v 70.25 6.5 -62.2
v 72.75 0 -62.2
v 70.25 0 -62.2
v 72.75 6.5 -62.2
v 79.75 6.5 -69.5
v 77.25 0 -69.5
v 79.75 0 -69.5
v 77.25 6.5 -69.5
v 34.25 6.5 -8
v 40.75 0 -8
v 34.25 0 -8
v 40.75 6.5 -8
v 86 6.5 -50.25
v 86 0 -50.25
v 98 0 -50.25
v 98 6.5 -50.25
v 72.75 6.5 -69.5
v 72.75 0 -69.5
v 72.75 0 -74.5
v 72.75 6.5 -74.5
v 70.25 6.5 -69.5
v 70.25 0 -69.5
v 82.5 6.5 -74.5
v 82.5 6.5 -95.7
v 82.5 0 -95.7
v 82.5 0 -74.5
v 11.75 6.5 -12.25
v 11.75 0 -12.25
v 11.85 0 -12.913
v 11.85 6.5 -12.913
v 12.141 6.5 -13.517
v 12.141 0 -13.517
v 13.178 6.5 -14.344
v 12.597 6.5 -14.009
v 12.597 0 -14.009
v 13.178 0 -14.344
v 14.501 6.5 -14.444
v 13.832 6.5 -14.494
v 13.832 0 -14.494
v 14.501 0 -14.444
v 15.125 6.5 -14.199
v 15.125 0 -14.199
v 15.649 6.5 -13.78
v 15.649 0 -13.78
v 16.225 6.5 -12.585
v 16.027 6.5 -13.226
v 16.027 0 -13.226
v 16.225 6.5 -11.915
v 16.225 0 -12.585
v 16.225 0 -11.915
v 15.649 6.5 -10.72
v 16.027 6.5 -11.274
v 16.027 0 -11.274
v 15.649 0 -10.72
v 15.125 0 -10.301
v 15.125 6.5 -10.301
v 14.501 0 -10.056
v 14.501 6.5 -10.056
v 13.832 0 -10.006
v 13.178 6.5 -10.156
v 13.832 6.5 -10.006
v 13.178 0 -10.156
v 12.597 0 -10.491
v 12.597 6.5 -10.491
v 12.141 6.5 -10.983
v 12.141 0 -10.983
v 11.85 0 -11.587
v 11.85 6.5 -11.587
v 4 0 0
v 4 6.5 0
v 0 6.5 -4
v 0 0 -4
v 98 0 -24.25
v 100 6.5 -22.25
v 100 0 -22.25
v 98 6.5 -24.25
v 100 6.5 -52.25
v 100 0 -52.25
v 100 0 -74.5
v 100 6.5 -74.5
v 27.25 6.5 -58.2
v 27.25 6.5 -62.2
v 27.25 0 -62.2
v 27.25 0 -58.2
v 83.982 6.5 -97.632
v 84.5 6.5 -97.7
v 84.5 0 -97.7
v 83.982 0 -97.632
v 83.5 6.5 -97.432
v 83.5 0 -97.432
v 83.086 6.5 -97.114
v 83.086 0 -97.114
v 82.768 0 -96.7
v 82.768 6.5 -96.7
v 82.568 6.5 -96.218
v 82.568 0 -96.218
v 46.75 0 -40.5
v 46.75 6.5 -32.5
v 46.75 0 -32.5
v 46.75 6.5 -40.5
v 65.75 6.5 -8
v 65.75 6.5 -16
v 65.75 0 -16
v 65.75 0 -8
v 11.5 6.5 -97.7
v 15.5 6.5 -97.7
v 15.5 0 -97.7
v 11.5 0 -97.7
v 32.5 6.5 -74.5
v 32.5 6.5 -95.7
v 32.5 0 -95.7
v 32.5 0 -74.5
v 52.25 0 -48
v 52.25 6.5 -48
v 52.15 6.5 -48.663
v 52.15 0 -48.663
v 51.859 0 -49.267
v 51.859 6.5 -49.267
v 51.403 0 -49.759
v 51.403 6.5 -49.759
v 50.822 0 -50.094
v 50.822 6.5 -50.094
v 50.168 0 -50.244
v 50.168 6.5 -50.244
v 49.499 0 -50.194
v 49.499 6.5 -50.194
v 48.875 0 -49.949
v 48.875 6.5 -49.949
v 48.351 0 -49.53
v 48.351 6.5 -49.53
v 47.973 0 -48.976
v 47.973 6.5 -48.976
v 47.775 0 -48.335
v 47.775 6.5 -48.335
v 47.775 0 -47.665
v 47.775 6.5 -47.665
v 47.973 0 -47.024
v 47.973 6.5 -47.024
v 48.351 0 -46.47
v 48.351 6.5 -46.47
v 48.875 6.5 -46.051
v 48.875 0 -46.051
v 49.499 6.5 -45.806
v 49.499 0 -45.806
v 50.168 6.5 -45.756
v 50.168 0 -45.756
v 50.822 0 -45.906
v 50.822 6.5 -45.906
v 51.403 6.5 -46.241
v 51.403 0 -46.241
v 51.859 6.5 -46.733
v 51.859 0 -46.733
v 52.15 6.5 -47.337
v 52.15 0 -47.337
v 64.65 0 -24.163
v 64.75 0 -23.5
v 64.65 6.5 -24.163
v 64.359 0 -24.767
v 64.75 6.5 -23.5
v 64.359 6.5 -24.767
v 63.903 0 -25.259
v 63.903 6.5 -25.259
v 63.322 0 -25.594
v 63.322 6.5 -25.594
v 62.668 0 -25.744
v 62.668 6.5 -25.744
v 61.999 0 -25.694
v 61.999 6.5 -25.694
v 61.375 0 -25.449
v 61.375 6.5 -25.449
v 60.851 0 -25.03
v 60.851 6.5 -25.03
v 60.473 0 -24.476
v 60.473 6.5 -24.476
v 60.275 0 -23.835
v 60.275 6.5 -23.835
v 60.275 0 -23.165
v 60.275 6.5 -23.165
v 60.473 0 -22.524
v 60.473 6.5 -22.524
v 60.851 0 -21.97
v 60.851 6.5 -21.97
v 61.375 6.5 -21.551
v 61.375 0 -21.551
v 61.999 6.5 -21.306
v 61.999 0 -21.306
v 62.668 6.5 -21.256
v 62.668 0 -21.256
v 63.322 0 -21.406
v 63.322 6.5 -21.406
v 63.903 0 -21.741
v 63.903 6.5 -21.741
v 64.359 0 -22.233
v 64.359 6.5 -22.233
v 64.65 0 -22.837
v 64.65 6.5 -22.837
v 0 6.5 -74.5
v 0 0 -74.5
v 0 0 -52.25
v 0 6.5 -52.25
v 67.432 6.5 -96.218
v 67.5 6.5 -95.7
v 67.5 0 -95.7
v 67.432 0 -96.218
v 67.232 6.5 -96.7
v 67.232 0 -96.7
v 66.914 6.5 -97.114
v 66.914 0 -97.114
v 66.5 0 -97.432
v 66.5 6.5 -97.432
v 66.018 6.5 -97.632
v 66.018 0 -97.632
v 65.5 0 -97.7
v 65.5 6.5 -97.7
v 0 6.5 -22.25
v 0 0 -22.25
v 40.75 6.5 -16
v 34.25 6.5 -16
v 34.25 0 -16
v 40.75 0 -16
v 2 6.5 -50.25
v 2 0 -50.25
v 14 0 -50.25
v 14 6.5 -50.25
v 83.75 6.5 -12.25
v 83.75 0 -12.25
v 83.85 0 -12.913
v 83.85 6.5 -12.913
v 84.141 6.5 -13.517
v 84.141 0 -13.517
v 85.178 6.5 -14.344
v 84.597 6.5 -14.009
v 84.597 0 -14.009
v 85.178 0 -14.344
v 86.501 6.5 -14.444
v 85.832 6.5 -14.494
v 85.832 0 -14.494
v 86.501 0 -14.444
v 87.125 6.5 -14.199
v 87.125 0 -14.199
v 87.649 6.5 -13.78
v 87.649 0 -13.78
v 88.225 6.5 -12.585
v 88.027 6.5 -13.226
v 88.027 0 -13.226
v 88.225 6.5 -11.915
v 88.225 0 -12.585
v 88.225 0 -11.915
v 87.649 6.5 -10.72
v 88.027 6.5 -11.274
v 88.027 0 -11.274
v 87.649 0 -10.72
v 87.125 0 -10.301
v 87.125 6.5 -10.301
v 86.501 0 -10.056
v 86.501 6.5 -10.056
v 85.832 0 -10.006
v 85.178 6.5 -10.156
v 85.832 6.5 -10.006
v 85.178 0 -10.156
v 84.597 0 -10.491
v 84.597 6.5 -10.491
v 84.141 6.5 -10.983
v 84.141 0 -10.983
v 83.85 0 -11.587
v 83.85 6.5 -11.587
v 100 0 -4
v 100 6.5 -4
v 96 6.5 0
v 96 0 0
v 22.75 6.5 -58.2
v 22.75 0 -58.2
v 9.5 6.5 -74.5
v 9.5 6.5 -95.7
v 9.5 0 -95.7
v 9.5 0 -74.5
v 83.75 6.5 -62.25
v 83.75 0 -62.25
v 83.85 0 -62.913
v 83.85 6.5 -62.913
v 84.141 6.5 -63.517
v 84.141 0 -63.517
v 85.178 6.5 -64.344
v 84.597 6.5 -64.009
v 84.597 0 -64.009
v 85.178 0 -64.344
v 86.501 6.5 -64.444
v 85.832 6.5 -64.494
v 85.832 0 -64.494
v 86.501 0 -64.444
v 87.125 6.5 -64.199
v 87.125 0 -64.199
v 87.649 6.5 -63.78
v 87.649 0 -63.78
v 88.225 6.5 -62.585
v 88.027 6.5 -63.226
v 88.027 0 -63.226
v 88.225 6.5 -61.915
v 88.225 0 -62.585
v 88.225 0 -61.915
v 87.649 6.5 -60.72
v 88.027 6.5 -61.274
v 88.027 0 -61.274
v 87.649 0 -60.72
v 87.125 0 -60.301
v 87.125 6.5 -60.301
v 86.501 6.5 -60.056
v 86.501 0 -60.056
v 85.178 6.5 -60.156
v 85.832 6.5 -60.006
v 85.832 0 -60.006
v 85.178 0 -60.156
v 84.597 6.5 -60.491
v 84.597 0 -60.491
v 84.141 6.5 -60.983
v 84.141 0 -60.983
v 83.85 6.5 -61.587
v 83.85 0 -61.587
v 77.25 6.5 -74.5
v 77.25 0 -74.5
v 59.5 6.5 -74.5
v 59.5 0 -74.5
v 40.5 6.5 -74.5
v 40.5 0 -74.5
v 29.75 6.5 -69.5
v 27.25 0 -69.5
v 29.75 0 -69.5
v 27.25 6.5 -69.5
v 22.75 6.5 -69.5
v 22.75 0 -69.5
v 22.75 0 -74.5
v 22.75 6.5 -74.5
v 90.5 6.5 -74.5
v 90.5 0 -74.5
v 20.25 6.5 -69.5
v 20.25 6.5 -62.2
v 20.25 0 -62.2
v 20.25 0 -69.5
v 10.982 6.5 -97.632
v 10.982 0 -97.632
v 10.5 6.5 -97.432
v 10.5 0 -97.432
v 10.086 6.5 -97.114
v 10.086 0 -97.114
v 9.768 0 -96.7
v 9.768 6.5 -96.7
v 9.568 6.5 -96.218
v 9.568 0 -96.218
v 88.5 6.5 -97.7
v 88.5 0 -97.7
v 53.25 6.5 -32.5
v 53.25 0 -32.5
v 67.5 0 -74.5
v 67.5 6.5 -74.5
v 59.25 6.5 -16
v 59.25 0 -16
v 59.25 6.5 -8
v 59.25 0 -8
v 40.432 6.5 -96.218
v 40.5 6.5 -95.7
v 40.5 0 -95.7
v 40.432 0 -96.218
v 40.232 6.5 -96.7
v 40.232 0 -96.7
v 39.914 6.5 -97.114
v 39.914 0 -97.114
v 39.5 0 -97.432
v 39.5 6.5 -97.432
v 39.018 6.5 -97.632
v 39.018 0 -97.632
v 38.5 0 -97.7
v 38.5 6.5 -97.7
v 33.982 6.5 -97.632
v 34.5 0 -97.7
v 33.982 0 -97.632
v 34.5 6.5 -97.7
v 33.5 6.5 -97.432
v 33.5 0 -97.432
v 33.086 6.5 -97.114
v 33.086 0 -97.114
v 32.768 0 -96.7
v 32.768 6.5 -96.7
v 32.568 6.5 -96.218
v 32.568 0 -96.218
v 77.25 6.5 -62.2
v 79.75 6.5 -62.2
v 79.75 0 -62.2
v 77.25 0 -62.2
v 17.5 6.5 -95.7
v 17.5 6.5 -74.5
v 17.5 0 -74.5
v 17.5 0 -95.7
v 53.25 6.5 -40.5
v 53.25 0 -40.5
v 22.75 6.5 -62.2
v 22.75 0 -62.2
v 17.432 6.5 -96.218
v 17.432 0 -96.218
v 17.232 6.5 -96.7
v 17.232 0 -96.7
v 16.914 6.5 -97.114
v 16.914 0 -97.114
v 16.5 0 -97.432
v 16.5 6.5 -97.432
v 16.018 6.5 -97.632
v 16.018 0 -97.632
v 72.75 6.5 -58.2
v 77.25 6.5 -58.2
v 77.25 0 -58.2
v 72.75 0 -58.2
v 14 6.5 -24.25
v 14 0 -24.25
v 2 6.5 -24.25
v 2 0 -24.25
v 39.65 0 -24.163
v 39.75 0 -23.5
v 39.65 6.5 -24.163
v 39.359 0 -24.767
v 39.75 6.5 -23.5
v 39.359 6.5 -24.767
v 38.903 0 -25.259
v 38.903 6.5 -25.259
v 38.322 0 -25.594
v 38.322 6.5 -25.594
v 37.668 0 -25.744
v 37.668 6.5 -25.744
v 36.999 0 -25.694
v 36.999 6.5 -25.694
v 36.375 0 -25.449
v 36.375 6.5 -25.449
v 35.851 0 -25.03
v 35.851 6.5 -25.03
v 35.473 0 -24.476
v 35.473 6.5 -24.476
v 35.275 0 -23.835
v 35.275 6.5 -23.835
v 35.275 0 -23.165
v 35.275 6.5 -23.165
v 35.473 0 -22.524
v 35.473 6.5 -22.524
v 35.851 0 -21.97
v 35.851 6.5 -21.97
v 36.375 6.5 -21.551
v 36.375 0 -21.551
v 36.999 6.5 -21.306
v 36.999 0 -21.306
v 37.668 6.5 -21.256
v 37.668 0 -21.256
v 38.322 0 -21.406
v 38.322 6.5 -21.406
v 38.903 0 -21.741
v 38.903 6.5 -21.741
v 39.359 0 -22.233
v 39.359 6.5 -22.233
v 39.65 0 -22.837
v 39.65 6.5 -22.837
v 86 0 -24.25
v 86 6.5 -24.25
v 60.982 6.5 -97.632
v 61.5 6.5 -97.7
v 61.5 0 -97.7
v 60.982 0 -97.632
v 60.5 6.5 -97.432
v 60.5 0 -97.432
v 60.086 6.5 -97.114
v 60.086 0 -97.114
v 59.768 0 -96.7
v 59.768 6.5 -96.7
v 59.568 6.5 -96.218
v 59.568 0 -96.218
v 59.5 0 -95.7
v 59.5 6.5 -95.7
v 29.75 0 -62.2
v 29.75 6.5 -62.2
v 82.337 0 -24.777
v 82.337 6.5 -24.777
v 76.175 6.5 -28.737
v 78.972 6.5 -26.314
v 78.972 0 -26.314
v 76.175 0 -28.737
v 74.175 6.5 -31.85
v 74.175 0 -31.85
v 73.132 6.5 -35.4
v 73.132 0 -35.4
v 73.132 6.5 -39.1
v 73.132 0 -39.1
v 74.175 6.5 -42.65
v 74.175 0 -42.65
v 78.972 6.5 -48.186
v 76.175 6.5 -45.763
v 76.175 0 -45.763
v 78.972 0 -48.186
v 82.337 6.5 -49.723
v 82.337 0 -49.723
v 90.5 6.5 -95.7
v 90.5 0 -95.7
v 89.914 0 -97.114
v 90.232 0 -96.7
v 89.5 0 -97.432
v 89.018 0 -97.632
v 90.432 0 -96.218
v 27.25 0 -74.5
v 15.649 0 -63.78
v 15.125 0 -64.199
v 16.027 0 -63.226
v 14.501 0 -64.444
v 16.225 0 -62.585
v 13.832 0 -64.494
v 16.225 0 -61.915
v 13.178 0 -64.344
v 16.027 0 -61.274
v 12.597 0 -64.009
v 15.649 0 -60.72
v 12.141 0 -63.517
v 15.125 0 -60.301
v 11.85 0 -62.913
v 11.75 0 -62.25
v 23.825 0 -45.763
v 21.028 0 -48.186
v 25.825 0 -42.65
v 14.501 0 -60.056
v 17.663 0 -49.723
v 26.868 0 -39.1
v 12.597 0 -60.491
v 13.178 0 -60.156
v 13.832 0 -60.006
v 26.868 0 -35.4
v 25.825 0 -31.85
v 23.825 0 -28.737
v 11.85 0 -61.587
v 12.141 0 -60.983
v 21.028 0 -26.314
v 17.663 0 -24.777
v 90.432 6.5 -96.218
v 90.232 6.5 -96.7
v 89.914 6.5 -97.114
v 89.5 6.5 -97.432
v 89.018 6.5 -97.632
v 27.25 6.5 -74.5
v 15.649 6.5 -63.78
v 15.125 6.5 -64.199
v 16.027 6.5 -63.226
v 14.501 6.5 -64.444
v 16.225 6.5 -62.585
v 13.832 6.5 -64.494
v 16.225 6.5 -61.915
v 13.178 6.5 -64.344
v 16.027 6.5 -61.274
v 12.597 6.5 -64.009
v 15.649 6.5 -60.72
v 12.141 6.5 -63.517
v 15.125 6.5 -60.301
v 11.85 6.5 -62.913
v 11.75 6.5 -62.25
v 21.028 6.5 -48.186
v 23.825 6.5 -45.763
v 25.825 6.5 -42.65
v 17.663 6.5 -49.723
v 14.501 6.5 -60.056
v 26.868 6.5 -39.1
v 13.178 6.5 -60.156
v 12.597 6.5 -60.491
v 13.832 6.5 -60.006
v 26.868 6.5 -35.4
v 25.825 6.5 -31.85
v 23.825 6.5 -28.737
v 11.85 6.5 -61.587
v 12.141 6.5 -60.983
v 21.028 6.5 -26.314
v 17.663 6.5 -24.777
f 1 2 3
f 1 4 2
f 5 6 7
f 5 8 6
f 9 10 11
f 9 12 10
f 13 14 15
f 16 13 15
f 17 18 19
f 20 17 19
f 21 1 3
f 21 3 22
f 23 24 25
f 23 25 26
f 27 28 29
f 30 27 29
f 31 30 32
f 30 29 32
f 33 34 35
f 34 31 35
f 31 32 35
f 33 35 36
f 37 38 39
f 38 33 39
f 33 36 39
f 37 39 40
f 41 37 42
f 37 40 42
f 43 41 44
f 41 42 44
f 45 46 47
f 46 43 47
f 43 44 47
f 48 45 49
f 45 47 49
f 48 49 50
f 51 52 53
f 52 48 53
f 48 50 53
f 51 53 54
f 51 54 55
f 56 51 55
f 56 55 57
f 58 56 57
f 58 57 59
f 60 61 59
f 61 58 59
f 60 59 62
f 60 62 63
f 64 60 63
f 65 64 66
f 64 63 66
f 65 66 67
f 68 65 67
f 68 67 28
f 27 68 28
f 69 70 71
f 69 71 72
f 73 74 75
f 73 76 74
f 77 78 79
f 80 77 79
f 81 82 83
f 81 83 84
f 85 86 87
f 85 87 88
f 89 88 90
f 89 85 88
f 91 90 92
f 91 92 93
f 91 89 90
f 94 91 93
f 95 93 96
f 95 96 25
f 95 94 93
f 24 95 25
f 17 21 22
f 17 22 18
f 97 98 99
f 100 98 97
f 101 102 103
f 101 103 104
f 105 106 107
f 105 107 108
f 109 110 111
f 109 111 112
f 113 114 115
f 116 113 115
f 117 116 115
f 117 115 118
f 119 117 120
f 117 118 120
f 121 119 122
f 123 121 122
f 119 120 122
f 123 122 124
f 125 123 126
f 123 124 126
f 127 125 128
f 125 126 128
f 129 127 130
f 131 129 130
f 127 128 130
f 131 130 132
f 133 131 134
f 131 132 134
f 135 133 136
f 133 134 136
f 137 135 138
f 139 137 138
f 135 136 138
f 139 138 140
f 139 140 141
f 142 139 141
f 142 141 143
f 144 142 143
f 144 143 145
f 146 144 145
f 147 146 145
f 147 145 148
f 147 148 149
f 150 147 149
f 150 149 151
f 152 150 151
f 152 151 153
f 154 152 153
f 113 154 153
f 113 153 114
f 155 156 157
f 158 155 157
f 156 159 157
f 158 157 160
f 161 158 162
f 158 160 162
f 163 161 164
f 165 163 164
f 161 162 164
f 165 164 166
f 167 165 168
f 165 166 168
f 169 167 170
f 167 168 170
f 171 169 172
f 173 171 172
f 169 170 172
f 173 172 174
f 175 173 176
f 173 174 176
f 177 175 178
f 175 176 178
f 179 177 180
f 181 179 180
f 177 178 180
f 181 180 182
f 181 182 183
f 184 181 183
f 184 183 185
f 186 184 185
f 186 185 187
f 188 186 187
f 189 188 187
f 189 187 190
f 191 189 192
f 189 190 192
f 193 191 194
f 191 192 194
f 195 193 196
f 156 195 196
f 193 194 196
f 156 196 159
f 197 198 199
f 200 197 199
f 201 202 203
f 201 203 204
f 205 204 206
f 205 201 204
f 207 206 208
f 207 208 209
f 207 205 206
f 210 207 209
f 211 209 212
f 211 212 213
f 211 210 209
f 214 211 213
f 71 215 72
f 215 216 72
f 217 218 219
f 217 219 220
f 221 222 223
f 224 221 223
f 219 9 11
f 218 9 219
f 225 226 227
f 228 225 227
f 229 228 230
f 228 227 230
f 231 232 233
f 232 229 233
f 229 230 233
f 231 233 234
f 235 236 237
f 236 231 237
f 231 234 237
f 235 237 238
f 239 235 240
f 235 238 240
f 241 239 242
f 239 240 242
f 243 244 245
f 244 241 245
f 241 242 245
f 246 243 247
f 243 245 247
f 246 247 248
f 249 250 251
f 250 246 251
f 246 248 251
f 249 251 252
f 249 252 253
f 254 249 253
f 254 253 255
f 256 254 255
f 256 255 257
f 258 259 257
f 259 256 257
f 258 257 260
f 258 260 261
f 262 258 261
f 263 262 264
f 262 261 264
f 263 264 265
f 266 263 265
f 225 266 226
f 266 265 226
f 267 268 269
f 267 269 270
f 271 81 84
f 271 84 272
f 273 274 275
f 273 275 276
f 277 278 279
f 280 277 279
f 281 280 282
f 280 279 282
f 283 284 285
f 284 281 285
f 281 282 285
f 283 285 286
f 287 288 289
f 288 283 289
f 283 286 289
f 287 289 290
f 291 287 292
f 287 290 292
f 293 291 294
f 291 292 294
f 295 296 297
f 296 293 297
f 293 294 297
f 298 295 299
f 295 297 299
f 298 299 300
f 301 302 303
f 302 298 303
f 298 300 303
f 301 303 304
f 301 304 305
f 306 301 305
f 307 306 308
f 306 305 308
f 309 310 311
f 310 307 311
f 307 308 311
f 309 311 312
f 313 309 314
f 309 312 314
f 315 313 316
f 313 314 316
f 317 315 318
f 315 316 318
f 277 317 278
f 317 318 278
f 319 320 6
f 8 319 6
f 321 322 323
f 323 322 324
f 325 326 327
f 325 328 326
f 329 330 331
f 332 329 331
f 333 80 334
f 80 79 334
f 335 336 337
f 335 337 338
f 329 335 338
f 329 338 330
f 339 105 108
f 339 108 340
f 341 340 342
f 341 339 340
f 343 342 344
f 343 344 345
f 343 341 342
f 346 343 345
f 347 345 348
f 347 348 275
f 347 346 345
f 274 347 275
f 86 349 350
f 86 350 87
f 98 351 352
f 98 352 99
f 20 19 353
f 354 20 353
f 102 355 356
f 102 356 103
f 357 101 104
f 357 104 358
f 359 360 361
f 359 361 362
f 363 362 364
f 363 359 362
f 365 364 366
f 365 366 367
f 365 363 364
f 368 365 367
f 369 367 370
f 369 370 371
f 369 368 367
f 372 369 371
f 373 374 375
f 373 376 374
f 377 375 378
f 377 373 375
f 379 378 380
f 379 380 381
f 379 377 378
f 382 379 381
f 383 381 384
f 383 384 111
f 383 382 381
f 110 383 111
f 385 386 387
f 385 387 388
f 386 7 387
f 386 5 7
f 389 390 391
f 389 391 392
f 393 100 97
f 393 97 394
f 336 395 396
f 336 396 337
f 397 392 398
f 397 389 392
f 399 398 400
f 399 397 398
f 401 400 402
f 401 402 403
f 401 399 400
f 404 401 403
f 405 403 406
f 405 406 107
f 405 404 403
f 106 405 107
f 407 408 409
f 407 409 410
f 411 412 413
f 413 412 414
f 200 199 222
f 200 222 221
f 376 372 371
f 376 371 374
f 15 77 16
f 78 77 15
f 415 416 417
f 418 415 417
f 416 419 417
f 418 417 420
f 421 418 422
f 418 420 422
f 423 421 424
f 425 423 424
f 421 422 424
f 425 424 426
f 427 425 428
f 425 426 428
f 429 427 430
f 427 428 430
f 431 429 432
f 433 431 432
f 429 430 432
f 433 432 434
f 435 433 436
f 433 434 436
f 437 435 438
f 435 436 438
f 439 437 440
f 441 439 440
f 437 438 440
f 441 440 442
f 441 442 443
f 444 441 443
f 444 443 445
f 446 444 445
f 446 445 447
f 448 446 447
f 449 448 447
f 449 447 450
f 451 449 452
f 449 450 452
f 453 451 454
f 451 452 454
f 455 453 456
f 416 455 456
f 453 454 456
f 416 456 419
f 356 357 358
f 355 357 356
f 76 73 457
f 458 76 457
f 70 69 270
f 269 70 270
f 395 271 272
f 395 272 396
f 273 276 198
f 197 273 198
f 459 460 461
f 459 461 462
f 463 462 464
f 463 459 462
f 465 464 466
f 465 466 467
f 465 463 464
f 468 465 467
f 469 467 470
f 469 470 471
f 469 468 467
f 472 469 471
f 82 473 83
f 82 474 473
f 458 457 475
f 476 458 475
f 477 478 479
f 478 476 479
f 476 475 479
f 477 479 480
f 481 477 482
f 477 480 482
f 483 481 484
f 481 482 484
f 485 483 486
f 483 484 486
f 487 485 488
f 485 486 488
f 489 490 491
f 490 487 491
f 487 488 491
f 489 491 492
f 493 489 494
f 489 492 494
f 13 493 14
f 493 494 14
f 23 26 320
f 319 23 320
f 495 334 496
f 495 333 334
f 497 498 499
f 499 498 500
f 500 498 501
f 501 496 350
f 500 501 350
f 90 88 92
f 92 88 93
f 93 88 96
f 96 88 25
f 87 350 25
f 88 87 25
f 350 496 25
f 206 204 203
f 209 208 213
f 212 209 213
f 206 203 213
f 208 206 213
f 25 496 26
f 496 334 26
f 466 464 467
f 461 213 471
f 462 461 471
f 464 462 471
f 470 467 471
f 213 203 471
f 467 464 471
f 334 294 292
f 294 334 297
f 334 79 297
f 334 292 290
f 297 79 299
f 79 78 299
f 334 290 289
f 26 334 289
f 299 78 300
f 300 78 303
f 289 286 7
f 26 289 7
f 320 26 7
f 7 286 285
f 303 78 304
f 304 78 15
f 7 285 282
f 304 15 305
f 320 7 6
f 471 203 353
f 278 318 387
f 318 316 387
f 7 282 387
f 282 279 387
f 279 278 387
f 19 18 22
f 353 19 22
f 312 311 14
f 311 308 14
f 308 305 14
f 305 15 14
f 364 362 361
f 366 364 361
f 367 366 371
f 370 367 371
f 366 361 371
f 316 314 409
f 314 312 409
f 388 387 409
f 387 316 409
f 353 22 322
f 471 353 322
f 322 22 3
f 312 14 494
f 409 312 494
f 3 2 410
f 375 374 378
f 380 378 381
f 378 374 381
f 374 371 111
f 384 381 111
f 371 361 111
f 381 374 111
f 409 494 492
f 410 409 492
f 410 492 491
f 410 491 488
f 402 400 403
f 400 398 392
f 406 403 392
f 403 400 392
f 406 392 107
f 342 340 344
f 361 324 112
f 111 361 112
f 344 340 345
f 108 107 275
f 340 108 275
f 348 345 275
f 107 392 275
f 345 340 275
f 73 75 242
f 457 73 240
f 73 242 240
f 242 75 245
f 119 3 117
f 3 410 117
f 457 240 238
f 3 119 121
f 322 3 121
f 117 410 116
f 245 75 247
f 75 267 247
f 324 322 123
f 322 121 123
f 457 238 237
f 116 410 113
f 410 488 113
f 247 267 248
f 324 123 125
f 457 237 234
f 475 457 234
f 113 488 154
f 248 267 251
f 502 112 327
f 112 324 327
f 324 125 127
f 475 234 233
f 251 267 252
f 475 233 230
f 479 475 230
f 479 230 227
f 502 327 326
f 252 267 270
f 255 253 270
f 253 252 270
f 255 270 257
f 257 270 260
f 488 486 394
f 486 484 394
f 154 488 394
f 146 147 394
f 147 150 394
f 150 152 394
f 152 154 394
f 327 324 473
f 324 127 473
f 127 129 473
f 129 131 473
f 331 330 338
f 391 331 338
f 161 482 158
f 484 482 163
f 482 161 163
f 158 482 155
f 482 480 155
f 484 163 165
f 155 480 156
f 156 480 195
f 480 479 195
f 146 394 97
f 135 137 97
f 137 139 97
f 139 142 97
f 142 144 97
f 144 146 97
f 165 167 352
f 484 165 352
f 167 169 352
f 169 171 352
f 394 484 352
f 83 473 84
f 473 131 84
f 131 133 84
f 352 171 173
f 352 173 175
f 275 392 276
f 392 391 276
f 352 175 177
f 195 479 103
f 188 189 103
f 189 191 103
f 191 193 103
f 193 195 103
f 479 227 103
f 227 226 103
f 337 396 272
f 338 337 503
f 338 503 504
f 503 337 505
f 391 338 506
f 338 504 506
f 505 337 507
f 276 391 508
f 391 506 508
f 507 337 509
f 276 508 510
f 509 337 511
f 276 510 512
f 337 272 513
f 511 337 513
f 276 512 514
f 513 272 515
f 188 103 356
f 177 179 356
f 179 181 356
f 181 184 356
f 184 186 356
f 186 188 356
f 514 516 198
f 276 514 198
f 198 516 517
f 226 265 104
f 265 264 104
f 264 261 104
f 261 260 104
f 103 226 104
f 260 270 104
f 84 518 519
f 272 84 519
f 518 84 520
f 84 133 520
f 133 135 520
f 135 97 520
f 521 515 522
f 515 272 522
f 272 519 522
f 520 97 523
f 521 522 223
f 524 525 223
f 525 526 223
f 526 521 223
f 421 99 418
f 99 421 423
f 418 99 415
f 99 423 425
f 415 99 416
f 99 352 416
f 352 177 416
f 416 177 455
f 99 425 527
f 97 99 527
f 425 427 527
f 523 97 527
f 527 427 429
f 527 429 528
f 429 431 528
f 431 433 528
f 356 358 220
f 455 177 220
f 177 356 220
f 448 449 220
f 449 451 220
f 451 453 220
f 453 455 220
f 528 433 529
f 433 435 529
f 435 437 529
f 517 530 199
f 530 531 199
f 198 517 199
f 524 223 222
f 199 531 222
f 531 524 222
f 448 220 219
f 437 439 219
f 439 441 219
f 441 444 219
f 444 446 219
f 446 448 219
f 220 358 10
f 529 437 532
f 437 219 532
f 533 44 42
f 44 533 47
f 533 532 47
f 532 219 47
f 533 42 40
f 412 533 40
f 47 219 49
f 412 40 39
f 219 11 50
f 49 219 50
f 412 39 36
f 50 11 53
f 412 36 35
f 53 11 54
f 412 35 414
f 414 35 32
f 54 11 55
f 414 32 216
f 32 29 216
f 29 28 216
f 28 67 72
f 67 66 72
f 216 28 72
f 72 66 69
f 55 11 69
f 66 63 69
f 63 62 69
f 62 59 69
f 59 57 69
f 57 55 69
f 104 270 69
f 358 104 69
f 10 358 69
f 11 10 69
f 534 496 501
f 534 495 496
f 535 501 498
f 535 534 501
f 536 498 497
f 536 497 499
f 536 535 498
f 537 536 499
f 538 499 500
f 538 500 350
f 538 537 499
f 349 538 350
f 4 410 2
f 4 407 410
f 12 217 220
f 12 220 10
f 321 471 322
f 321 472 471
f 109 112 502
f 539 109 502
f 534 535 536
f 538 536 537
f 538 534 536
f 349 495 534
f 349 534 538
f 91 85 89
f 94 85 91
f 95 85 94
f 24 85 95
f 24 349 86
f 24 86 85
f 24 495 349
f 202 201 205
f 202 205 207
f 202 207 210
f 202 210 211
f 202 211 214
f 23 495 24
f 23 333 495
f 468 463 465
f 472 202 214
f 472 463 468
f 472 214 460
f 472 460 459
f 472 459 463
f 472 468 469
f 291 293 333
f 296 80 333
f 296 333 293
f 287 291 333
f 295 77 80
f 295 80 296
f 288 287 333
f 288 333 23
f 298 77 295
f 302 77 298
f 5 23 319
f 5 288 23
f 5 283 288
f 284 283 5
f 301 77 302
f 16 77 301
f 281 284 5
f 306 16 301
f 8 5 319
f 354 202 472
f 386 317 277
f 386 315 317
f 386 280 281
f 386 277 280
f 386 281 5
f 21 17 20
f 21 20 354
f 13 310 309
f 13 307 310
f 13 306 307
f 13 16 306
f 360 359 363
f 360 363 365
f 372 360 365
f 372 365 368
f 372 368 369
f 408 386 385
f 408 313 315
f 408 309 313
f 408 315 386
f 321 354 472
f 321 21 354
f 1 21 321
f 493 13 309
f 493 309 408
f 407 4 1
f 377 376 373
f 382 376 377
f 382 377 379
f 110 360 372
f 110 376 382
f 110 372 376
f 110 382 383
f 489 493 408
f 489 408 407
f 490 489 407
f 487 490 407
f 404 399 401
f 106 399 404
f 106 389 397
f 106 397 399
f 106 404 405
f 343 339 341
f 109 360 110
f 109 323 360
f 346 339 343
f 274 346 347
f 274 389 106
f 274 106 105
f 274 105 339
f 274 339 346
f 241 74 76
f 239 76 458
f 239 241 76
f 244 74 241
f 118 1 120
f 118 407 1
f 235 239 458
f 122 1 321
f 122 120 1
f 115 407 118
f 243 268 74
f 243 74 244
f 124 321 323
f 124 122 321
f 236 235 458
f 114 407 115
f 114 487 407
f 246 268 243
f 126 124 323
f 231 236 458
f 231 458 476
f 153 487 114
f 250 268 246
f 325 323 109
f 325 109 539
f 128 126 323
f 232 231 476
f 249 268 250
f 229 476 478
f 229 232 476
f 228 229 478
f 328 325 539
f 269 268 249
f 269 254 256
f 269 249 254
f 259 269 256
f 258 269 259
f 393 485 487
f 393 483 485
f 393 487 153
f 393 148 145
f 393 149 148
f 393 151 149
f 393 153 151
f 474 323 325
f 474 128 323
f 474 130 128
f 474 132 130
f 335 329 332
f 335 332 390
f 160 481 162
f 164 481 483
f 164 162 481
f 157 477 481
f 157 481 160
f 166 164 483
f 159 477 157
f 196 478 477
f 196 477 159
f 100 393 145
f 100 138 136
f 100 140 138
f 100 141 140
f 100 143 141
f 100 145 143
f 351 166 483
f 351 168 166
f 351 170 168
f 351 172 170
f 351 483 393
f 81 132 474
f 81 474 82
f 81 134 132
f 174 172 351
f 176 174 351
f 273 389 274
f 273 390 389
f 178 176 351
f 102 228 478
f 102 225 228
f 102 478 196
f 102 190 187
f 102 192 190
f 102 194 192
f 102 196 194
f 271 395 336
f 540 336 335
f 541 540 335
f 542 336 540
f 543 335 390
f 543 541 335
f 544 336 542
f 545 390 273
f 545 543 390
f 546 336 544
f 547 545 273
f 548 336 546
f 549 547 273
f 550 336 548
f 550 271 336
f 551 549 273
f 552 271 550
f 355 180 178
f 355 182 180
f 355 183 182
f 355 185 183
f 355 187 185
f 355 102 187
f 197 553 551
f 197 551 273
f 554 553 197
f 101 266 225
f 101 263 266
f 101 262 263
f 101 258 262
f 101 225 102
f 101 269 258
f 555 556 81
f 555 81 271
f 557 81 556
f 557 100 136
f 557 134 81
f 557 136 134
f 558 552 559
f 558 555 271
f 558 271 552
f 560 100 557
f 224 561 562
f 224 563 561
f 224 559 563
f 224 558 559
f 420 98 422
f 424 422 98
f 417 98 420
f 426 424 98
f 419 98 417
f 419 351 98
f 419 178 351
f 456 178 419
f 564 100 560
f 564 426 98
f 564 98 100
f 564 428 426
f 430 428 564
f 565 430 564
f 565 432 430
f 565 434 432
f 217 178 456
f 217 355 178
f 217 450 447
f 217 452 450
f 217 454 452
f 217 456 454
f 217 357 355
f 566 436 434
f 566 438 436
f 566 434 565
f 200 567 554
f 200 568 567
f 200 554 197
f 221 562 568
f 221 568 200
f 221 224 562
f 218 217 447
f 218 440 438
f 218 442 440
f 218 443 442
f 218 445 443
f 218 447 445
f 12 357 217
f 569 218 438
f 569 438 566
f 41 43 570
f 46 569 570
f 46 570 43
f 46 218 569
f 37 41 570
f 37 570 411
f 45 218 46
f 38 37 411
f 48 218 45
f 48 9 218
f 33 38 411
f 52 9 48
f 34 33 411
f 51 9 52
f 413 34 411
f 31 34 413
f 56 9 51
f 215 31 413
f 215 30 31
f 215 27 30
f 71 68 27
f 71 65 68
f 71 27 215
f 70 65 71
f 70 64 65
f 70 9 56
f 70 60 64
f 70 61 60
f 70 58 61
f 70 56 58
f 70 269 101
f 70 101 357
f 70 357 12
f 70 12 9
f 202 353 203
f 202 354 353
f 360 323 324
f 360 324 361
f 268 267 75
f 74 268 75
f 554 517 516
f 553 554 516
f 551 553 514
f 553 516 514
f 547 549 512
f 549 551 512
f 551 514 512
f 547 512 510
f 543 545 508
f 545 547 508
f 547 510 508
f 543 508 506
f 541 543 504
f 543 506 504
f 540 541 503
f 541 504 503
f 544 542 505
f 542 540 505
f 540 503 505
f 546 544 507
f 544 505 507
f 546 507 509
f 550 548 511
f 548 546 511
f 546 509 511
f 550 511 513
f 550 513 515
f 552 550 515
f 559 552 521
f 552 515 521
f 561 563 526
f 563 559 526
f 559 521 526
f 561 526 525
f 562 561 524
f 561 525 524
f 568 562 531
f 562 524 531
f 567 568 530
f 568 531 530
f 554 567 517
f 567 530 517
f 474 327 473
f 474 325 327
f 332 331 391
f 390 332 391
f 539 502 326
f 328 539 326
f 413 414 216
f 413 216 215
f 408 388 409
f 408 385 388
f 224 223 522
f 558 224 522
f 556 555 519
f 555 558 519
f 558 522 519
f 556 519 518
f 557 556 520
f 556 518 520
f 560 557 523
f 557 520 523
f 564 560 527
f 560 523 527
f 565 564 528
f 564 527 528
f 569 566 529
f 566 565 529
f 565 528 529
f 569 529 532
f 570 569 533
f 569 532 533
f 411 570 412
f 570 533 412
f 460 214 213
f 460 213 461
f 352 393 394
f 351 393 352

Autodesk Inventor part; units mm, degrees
ref_plane "YZ Plane" through (0, 0, 0) normal (1, 0, 0) x (0, 1, 0)
ref_plane "XZ Plane" through (0, 0, 0) normal (0, 1, 0) x (-1, 0, 0)
ref_plane "XY Plane" through (0, 0, 0) normal (0, 0, 1) x (1, 0, 0)
sketch "Sketch1" plane through (0, 0, 0) normal (0, 1, 0) x (-1, 0, 0)
  line L0 (0, 0) -> (-100, 0)
  line L1 (-100, 0) -> (-100, -24.25)
  line L2 (-100, -24.25) -> (-86, -24.25)
  arc A0 (-86, -50.25) -> (-86, -24.25) centre (-86, -37.25) ccw
  line L3 (-86, -50.25) -> (-100, -50.25)
  line L4 (-100, -50.25) -> (-100, -74.5)
  line L5 (-100, -74.5) -> (0, -74.5)
  line L6 (0, -74.5) -> (0, -50.25)
  line L7 (0, -50.25) -> (-14, -50.25)
  arc A1 (-14, -24.25) -> (-14, -50.25) centre (-14, -37.25) ccw
  line L8 (-14, -24.25) -> (0, -24.25)
  line L9 (0, -24.25) -> (0, 0)
  circle A2 centre (-14, -62.25) radius 2.25
  circle A3 centre (-14, -12.25) radius 2.25
  circle A4 centre (-86, -62.25) radius 2.25
  circle A5 centre (-86, -12.25) radius 2.25
  dimension "d0" = 13
  dimension "d1" = 50
  dimension "d2" = 4.5
  dimension "d3" = 25
  dimension "d5" = 12.25
  dimension "d6" = 100
  dimension "d10" = 14
extrude "Extrusion1" add sketch "Sketch1" along normal blind 6.5
sketch "Sketch3" plane through (0, 6.5, 0) normal (0, 1, 0) x (1, 0, 0)
  line L0 (100, 74.5) -> (0, 74.5) projected
  line L1 (22.75, 74.5) -> (27.25, 74.5)
  line L2 (27.25, 58.2) -> (22.75, 58.2)
  line L3 (29.75, 69.5) -> (29.75, 62.2)
  line L4 (20.25, 62.2) -> (20.25, 69.5)
  line L5 (27.25, 74.5) -> (27.25, 69.5)
  line L6 (27.25, 62.2) -> (27.25, 58.2)
  line L7 (22.75, 58.2) -> (22.75, 62.2)
  line L8 (22.75, 69.5) -> (22.75, 74.5)
  line L9 (20.25, 69.5) -> (22.75, 69.5)
  line L10 (27.25, 69.5) -> (29.75, 69.5)
  line L11 (29.75, 62.2) -> (27.25, 62.2)
  line L12 (22.75, 62.2) -> (20.25, 62.2)
  line L13 (72.75, 74.5) -> (77.25, 74.5)
  line L14 (77.25, 58.2) -> (72.75, 58.2)
  line L15 (79.75, 69.5) -> (79.75, 62.2)
  line L16 (70.25, 62.2) -> (70.25, 69.5)
  line L17 (77.25, 74.5) -> (77.25, 69.5)
  line L18 (77.25, 62.2) -> (77.25, 58.2)
  line L19 (72.75, 58.2) -> (72.75, 62.2)
  line L20 (72.75, 69.5) -> (72.75, 74.5)
  line L21 (70.25, 69.5) -> (72.75, 69.5)
  line L22 (77.25, 69.5) -> (79.75, 69.5)
  line L23 (79.75, 62.2) -> (77.25, 62.2)
  line L24 (72.75, 62.2) -> (70.25, 62.2)
  line L25 (29.75, 65.85) -> (70.25, 65.85) construction
  point P0 (25, 58.2)
  point P1 (75, 58.2)
  point P2 (50, 65.85)
  point P3 (50, 74.5)
  dimension "d15" = 4.5
  dimension "d16" = 2.5
  dimension "d17" = 4
  dimension "d18" = 5
  dimension "d19" = 7.3
  dimension "d20" = 4.5
  dimension "d21" = 2.5
  dimension "d22" = 4
  dimension "d23" = 5
  dimension "d24" = 7.3
  dimension "d25" = 50
extrude "Extrusion2" cut sketch "Sketch3" against normal through all
sketch "Sketch4" plane through (0, 6.5, 0) normal (0, 1, 0) x (1, 0, 0)
  line L0 (22.75, 74.5) -> (0, 74.5) projected
  line L1 (100, 74.5) -> (77.25, 74.5) projected
  line L2 (77.25, 58.2) -> (72.75, 58.2) projected
  line L3 (72.75, 74.5) -> (27.25, 74.5) projected
  line L4 (27.25, 58.2) -> (22.75, 58.2) projected
  line L5 (9.5, 74.5) -> (17.5, 74.5)
  line L6 (17.5, 74.5) -> (17.5, 95.7)
  line L7 (15.5, 97.7) -> (11.5, 97.7)
  line L8 (9.5, 95.7) -> (9.5, 74.5)
  line L9 (32.5, 74.5) -> (40.5, 74.5)
  line L10 (40.5, 74.5) -> (40.5, 95.7)
  line L11 (38.5, 97.7) -> (34.5, 97.7)
  line L12 (32.5, 95.7) -> (32.5, 74.5)
  line L13 (59.5, 74.5) -> (67.5, 74.5)
  line L14 (67.5, 74.5) -> (67.5, 95.7)
  line L15 (65.5, 97.7) -> (61.5, 97.7)
  line L16 (59.5, 95.7) -> (59.5, 74.5)
  line L17 (82.5, 74.5) -> (90.5, 74.5)
  line L18 (90.5, 74.5) -> (90.5, 95.7)
  line L19 (88.5, 97.7) -> (84.5, 97.7)
  line L20 (82.5, 95.7) -> (82.5, 74.5)
  arc A0 (11.5, 97.7) -> (9.5, 95.7) centre (11.5, 95.7) ccw
  arc A1 (17.5, 95.7) -> (15.5, 97.7) centre (15.5, 95.7) ccw
  arc A2 (34.5, 97.7) -> (32.5, 95.7) centre (34.5, 95.7) ccw
  arc A3 (40.5, 95.7) -> (38.5, 97.7) centre (38.5, 95.7) ccw
  arc A4 (61.5, 97.7) -> (59.5, 95.7) centre (61.5, 95.7) ccw
  arc A5 (67.5, 95.7) -> (65.5, 97.7) centre (65.5, 95.7) ccw
  arc A6 (84.5, 97.7) -> (82.5, 95.7) centre (84.5, 95.7) ccw
  arc A7 (90.5, 95.7) -> (88.5, 97.7) centre (88.5, 95.7) ccw
  point P0 (25, 58.2)
  point P1 (75, 58.2)
  dimension "d28" = 2
  dimension "d29" = 23.2
  dimension "d30" = 8
  dimension "d31" = 8
  dimension "d32" = 8
  dimension "d33" = 8
  dimension "d34" = 15
  dimension "d35" = 15
  dimension "d36" = 7.5
  dimension "d37" = 7.5
extrude "Extrusion3" add sketch "Sketch4" against normal blind 6.5
chamfer "Chamfer1" distance 4 angle 45 2 edges at (100, 3.25, 0) (0, 3.25, 0)
chamfer "Chamfer2" distance 2 angle 45 4 edges at (100, 3.25, -24.25) (100, 3.25, -50.25) (0, 3.25, -50.25) (0, 3.25, -24.25)
sketch "Sketch5" plane through (0, 6.5, 0) normal (0, 1, 0) x (1, 0, 0)
  line L0 (4, 0) -> (96, 0) projected
  line L1 (34.25, 16) -> (40.75, 16)
  line L2 (40.75, 16) -> (40.75, 8)
  line L3 (40.75, 8) -> (34.25, 8)
  line L4 (34.25, 8) -> (34.25, 16)
  line L5 (59.25, 16) -> (65.75, 16)
  line L6 (65.75, 16) -> (65.75, 8)
  line L7 (65.75, 8) -> (59.25, 8)
  line L8 (59.25, 8) -> (59.25, 16)
  circle A0 centre (37.5, 23.5) radius 2.25
  circle A1 centre (62.5, 23.5) radius 2.25
  line L9 (37.5, 23.5) -> (62.5, 23.5) construction
  point P0 (0, 0)
  point P1 (37.5, 16)
  point P2 (62.5, 16)
  point P3 (50, 23.5)
  point P4 (50, 0)
  dimension "d46" = 4.5
  dimension "d47" = 6.5
  dimension "d48" = 8
  dimension "d49" = 25
  dimension "d50" = 8
  dimension "d51" = 7.5
extrude "Extrusion4" cut sketch "Sketch5" against normal through all
sketch "Sketch6" plane through (0, 6.5, 0) normal (0, 1, 0) x (1, 0, 0)
  line L0 (59.5, 74.5) -> (40.5, 74.5) projected
  line L1 (46.75, 40.5) -> (53.25, 40.5)
  line L2 (53.25, 40.5) -> (53.25, 32.5)
  line L3 (53.25, 32.5) -> (46.75, 32.5)
  line L4 (46.75, 32.5) -> (46.75, 40.5)
  circle A0 centre (50, 48) radius 2.25
  point P0 (0, 0)
  point P1 (50, 74.5)
  point P2 (50, 40.5)
  dimension "d54" = 6.5
  dimension "d55" = 8
  dimension "d56" = 4.5
  dimension "d57" = 7.5
  dimension "d58" = 34
extrude "Extrusion5" cut sketch "Sketch6" against normal through all
equation "\"d3\" = 0.5 * d1"
equation "\"d31\" = d30"
equation "\"d32\" = d31"
equation "\"d33\" = d32"
equation "\"d36\" = 0.5 * d34"
equation "\"d37\" = 0.5 * d35"
properties part number "x_carryage_extruder_mount"
